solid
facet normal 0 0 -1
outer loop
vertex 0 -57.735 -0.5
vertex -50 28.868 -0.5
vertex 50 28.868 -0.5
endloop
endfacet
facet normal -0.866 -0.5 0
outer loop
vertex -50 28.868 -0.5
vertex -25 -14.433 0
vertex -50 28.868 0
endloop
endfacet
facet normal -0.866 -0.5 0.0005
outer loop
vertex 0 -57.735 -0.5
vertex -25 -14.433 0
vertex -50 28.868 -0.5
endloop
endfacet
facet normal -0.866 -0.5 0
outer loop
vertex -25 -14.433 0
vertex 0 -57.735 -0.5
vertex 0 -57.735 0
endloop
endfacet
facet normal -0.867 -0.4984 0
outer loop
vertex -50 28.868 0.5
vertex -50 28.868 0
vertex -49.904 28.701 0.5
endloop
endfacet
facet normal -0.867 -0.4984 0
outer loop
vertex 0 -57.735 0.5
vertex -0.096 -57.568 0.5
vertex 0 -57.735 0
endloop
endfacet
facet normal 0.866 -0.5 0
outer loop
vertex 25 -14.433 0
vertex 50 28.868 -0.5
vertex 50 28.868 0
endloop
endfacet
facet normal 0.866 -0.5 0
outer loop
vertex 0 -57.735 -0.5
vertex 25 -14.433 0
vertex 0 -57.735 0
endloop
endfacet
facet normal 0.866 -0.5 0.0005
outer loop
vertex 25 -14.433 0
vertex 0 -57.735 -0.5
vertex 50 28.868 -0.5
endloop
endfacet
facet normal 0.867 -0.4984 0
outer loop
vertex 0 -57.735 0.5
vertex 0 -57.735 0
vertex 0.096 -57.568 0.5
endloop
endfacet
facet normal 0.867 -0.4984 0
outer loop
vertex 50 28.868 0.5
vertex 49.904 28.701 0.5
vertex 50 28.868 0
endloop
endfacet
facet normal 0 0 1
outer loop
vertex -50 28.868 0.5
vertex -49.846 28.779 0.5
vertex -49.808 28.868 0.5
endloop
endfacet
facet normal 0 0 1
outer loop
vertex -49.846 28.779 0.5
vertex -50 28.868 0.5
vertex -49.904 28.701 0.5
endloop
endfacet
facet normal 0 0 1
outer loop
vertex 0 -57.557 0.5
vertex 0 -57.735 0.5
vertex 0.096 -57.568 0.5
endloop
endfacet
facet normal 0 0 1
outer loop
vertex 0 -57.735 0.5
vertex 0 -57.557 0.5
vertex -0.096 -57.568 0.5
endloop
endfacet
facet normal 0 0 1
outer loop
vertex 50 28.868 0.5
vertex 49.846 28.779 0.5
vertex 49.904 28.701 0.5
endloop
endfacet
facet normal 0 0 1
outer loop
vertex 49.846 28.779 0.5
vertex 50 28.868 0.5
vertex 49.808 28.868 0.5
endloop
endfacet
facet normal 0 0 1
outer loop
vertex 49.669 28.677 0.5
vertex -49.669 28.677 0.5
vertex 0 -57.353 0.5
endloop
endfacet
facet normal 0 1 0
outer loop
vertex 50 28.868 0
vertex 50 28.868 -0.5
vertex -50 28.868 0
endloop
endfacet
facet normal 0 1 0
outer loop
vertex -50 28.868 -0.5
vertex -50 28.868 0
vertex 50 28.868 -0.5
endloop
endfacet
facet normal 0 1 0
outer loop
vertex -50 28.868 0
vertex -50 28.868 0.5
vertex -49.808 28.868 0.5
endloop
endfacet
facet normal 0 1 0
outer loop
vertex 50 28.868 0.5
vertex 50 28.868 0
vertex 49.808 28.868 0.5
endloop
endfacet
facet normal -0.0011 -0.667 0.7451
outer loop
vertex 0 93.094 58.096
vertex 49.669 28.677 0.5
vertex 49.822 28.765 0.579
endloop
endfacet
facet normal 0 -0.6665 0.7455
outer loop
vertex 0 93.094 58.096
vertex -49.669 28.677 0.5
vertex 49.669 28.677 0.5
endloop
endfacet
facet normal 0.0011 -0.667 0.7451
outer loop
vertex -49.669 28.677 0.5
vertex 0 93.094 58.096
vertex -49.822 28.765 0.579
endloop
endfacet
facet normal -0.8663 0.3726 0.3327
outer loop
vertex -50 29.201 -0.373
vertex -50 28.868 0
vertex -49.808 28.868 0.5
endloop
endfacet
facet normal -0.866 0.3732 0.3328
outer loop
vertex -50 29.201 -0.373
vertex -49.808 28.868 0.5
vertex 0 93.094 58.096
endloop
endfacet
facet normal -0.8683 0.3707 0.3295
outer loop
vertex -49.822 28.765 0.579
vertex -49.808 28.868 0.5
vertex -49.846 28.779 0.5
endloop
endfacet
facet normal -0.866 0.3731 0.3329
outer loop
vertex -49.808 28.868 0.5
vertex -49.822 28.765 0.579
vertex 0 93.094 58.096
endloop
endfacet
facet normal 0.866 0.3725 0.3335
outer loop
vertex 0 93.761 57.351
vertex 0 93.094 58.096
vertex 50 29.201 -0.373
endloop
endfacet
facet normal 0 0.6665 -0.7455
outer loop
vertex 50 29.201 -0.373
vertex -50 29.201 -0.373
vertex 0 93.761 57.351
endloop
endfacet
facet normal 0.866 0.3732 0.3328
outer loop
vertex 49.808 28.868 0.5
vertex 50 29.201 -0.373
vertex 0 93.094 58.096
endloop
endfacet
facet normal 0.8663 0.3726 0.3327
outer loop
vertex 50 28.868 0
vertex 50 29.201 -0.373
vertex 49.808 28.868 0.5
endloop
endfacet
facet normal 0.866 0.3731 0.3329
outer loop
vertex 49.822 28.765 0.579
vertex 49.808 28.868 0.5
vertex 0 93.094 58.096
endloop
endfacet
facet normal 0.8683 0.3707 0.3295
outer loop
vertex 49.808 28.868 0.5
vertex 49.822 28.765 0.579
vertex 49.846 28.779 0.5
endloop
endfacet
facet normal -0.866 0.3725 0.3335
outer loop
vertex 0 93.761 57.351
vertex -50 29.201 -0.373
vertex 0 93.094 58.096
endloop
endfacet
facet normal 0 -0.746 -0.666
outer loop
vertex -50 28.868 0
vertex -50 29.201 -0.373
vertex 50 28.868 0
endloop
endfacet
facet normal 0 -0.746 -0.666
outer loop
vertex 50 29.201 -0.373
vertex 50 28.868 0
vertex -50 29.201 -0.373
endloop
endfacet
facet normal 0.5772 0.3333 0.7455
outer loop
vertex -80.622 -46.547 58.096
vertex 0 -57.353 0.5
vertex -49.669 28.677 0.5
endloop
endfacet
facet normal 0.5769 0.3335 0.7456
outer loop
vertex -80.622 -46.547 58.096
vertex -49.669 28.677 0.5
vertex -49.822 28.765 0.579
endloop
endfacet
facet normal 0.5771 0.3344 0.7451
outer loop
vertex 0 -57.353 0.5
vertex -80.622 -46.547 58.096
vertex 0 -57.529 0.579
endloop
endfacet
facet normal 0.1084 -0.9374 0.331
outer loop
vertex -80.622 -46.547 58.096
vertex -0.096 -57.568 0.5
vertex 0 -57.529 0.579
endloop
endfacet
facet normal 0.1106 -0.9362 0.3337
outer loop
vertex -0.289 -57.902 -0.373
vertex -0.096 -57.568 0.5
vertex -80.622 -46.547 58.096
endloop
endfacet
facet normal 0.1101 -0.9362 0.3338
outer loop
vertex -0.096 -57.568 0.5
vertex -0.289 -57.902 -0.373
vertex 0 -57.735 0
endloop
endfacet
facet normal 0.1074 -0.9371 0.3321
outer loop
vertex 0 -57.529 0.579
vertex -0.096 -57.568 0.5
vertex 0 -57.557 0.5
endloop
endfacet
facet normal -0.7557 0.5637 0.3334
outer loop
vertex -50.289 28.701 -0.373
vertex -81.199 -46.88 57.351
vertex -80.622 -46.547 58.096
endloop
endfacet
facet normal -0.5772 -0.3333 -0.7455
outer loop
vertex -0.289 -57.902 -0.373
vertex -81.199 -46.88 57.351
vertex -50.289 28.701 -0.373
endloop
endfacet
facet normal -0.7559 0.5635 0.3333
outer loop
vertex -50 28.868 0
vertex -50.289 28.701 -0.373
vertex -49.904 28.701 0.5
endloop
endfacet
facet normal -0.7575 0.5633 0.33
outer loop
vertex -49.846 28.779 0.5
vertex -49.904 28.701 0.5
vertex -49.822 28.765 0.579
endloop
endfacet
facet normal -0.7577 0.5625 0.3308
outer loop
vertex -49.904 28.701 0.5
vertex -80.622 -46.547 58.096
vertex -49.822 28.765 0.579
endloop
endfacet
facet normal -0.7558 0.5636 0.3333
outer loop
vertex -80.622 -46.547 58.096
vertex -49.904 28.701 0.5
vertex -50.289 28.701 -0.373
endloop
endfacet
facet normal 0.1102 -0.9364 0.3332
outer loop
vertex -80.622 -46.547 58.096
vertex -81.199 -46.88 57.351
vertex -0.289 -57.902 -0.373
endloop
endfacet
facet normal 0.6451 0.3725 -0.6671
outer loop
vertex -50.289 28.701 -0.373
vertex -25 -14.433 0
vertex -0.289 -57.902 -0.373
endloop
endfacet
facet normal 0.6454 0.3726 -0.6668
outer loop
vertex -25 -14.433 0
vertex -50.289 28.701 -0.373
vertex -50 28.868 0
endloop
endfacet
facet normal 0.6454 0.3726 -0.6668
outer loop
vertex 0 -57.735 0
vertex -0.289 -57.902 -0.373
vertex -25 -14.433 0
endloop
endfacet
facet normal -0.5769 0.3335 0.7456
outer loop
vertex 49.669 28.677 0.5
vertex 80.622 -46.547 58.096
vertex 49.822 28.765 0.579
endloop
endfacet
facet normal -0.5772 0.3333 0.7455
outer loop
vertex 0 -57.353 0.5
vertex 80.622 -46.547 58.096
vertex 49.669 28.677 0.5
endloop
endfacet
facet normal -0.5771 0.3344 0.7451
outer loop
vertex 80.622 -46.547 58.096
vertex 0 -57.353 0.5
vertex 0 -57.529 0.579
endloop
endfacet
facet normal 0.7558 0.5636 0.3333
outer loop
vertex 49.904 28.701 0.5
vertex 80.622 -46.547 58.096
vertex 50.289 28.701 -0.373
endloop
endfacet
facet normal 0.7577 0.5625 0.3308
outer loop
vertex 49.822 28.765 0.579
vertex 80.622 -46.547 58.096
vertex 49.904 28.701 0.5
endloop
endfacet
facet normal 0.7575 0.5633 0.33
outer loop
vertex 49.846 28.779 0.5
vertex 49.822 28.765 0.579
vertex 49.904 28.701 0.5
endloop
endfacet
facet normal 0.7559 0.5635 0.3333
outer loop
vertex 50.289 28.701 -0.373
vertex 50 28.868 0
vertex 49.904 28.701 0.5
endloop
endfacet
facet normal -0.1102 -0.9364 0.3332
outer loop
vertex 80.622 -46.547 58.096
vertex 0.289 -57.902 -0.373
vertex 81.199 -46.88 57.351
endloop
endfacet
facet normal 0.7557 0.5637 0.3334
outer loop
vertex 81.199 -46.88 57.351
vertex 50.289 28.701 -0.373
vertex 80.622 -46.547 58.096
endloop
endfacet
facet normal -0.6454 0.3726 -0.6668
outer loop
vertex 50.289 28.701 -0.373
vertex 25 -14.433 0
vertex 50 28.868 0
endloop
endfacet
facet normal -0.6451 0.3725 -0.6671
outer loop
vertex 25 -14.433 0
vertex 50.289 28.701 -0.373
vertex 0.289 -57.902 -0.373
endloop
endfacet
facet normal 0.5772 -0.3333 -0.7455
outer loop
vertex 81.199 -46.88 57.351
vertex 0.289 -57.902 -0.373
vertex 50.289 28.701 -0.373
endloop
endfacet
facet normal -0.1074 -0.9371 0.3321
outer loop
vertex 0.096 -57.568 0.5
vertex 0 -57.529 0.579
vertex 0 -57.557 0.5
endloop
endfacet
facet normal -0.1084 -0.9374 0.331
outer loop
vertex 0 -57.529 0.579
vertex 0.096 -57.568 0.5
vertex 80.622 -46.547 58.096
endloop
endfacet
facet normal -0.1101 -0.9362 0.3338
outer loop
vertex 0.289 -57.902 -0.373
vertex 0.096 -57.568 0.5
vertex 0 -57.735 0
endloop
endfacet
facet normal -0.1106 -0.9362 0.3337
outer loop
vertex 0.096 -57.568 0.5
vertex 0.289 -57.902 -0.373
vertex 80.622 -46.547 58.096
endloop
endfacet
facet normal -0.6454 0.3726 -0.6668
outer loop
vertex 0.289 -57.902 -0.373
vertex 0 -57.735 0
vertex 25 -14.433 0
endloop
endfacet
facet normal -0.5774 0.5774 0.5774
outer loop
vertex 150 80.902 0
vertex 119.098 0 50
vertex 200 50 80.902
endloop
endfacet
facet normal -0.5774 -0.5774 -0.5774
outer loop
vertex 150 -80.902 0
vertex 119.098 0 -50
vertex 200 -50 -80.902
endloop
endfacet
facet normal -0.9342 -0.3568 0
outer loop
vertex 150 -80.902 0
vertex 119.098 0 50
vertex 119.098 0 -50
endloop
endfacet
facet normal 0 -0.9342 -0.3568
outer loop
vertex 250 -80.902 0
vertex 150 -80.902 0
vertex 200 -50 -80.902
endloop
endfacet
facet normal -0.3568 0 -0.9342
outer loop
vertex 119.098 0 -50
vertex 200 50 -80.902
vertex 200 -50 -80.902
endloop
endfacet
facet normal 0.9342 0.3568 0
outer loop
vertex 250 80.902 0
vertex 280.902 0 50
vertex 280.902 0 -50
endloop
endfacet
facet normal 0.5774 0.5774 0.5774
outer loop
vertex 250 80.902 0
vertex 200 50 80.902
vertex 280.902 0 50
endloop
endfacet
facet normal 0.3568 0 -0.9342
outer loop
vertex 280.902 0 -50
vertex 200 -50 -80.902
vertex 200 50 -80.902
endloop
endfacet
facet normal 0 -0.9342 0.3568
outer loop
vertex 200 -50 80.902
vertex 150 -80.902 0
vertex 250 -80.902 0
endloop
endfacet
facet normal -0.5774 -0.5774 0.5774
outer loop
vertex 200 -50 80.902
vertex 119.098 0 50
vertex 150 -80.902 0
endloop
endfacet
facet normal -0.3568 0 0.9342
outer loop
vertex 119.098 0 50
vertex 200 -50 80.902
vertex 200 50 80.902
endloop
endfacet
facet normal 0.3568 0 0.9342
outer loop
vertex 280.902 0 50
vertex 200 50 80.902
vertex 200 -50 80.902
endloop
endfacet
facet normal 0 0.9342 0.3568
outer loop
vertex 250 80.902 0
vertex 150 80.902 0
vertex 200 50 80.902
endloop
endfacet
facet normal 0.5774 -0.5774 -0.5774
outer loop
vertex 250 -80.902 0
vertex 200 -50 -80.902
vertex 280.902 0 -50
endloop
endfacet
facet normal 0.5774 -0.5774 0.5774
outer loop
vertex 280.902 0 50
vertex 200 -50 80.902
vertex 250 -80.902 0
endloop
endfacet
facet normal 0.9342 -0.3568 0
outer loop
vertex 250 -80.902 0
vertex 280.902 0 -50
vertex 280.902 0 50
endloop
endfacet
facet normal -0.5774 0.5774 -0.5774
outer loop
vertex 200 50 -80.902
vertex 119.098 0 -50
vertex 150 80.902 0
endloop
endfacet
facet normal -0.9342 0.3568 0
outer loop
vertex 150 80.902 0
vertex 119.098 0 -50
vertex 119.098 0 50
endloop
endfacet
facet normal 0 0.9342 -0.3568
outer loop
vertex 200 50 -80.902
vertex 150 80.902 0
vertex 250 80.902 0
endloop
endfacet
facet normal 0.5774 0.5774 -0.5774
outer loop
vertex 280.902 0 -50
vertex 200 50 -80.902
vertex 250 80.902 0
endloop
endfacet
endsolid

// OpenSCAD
phi = (1 + sqrt(5)) / 2;
x=100;
y=sqrt(3)/2*x;

face();
translate([0,y*(1/3),0]) rotate([-138.2,0,0]) translate([0,-y*(1/3),0]) face();
rotate([0,0,360/3]) translate([0,y*(1/3),0]) rotate([-138.2,0,0]) translate([0,-y*(1/3),0]) face();
rotate([0,0,360/3*2]) translate([0,y*(1/3),0]) rotate([-138.2,0,0]) translate([0,-y*(1/3),0]) face();

module face() {
  points=[
    [0,-y*(2/3)],
    [x/2,y*(1/3)],
    [-x/2,y*(1/3)]
  ];
  translate([0,0,-0.5]) linear_extrude(height=1) polygon(points);
}

translate([200,0,0]) icosahedron();

module icosahedron() {
  hull() {
    plane(); 
    rotate([90,0,90]) plane();
    rotate([0,90,90]) plane();
  }
}

module plane() {
  y=x*phi;
  cube([x,y,0.00001], true);
}
